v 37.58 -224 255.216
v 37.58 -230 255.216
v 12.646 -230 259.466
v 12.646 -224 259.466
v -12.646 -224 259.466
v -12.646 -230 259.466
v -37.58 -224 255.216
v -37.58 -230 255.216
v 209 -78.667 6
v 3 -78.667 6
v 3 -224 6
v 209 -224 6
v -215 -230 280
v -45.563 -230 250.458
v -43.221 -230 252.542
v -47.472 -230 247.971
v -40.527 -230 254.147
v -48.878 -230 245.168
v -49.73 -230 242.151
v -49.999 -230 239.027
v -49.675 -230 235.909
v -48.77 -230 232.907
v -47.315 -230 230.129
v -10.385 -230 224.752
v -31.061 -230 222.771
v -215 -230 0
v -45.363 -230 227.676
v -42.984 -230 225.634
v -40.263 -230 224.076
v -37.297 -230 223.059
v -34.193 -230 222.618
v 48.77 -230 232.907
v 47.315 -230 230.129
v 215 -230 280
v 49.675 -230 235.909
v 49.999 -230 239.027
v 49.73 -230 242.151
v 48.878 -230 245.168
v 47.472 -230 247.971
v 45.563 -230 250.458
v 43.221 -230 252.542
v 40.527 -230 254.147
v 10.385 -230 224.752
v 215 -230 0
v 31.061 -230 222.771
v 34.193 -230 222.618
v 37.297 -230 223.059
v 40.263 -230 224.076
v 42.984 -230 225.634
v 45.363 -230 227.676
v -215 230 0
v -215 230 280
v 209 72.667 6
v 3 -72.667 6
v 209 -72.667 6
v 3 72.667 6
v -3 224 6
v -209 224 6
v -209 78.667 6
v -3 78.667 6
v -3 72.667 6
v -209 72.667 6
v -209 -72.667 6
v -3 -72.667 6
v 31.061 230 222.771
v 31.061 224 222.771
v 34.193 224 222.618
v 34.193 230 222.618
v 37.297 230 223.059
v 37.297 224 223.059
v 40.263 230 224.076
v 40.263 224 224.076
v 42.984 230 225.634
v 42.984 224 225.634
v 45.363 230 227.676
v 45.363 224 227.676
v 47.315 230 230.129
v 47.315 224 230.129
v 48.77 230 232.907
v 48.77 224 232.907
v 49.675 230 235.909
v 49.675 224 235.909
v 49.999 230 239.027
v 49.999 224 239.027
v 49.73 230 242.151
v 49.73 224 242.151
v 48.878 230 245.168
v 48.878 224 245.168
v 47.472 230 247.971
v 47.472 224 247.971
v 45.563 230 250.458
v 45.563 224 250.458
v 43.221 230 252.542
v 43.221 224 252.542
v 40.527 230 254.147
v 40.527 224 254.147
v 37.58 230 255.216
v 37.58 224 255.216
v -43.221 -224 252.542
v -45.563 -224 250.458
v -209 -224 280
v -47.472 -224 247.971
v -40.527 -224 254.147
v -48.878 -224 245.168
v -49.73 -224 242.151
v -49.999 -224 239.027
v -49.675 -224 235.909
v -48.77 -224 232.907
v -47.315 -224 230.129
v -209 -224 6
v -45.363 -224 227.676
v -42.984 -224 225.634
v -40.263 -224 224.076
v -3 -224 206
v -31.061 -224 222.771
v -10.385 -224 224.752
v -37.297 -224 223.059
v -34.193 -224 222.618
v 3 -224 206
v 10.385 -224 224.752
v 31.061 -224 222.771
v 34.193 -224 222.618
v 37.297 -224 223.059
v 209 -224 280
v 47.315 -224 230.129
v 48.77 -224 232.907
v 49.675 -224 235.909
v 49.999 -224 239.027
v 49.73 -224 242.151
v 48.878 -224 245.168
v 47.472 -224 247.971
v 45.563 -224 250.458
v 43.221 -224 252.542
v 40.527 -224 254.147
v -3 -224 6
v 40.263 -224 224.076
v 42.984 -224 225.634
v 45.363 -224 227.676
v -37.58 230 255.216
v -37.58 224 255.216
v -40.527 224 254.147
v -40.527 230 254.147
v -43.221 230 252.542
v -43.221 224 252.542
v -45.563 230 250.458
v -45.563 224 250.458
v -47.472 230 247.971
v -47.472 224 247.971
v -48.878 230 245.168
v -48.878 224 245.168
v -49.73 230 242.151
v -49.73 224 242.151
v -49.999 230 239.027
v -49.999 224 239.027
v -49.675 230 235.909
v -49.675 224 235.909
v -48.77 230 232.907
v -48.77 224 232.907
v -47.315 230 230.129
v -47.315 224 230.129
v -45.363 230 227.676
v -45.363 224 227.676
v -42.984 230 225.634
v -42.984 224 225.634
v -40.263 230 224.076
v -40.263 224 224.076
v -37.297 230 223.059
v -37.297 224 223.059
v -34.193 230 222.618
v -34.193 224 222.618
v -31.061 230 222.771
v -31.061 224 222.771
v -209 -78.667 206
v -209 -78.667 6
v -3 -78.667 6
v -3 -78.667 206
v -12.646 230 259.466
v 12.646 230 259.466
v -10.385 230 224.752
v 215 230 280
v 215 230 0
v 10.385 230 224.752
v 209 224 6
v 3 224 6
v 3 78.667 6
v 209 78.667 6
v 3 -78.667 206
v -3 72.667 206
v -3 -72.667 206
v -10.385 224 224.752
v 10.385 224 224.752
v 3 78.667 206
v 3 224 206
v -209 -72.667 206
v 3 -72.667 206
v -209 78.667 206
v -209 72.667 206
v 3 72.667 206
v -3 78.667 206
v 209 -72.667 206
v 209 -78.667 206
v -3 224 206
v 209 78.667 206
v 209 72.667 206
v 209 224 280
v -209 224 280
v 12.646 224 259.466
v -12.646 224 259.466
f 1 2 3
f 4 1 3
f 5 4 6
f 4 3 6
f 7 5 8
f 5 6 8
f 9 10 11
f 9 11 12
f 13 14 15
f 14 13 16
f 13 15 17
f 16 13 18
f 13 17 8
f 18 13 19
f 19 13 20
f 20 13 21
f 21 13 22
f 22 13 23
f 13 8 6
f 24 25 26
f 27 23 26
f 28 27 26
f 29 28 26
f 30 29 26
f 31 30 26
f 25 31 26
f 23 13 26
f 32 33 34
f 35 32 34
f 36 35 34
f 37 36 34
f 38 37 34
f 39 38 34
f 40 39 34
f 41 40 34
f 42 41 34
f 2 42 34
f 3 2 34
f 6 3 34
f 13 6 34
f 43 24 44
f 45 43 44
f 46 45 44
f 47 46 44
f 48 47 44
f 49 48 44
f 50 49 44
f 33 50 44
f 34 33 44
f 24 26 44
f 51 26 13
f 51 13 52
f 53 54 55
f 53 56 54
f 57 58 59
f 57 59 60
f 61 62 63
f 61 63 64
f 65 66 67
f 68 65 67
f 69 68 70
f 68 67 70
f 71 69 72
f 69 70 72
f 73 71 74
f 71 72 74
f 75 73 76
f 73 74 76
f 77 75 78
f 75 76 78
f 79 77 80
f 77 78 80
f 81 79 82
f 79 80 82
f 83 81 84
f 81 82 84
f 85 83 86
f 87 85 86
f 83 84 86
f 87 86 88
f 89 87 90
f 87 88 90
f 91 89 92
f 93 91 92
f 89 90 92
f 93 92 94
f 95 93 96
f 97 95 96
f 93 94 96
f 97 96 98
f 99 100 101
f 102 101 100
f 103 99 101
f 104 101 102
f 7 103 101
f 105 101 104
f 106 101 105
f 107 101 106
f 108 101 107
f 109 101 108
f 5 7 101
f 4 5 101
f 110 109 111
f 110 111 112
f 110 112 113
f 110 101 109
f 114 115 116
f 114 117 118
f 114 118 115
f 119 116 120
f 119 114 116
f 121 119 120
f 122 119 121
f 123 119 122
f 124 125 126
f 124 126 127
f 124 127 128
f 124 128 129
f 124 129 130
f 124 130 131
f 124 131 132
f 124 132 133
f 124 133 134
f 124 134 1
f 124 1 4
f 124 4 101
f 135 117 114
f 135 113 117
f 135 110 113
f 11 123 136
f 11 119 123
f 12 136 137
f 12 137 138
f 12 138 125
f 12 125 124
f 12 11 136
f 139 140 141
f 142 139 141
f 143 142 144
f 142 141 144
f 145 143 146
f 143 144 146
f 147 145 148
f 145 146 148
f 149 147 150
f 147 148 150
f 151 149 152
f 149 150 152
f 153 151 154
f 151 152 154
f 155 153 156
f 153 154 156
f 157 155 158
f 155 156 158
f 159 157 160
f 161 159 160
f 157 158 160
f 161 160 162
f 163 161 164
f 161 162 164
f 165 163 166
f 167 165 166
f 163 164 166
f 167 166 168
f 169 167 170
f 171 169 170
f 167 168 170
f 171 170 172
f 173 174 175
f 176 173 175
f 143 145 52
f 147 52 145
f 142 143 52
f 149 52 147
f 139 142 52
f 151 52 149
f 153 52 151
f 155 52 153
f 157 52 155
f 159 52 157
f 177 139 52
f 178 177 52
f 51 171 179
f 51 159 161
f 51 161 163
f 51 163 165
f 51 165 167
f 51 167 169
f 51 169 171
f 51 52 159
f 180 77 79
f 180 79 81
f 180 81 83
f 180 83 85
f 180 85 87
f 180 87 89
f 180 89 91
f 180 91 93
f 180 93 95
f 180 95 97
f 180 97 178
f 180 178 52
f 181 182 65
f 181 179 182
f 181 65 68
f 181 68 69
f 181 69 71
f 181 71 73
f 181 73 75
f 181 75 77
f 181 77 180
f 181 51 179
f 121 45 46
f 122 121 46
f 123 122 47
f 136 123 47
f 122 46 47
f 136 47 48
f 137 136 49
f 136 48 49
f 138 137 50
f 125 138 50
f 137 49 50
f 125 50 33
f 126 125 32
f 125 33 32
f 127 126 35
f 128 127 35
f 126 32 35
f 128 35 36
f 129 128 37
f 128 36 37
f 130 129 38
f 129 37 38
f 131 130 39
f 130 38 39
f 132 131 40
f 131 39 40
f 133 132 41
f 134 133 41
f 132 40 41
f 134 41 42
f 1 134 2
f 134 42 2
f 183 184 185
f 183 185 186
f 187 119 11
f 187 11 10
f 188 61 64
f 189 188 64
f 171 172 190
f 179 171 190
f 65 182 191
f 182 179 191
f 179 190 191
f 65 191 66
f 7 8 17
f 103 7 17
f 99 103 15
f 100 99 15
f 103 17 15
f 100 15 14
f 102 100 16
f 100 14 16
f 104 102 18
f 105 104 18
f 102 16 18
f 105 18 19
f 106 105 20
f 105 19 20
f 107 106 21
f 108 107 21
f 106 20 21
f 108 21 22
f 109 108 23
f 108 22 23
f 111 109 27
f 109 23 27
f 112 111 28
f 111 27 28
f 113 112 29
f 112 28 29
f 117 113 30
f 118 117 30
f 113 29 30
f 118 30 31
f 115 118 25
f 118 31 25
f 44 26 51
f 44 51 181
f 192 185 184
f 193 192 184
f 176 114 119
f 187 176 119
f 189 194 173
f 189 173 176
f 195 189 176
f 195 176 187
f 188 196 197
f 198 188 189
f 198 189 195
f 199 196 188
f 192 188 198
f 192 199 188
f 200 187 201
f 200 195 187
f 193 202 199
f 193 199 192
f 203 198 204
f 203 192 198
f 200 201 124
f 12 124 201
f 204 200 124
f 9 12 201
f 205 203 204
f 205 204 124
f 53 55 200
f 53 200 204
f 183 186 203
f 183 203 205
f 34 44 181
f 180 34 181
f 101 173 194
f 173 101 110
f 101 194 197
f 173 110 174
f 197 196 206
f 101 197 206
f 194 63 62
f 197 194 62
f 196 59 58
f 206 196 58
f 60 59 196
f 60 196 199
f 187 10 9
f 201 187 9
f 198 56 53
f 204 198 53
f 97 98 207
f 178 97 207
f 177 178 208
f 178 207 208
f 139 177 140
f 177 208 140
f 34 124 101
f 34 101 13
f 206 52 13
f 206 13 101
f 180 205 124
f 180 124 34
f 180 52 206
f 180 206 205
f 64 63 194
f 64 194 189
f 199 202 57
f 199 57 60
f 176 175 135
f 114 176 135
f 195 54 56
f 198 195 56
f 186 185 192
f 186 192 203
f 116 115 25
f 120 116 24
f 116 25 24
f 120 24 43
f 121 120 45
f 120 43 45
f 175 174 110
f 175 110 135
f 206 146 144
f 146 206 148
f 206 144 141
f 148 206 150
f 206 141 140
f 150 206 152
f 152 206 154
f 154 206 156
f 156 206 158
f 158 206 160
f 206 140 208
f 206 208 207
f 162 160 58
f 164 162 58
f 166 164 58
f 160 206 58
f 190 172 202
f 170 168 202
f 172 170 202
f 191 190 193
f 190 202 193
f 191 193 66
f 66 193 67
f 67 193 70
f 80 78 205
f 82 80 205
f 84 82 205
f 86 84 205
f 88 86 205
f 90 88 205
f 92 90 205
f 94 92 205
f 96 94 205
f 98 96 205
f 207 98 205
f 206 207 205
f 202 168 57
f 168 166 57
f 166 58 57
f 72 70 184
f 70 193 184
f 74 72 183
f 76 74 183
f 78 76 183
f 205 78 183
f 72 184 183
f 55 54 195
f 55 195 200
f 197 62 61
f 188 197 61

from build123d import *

# Parameters (mm, degrees)
F0_W     = 430
F0_H     = 460
F1_DEPTH = 280
F2_T     = -6
F4_DEPTH = 460.001
F5_W     = 206
F5_H     = 6
F6_DEPTH = 200


with BuildPart() as f1:
    # F0 (on Top) → F1 (new body)
    with BuildSketch(Plane.XY):
        Rectangle(F0_W, F0_H)
    extrude(amount=F1_DEPTH)

    # F2
    f2_openings = [f1.faces().sort_by_distance(p)[0] for p in [
        (0, 0, 280),
    ]]
    offset(amount=F2_T, openings=f2_openings)

    # F3 (on face) → F4 (cut, through all)
    with BuildSketch(Plane.XZ.offset(230)):
        with BuildLine():
            ThreePointArc((31.061347, 222.770627), (49.67535, 235.90859), (37.579824, 255.216242))
            ThreePointArc((37.579824, 255.216242), (0, 260), (-37.579824, 255.216242))
            ThreePointArc((-37.579824, 255.216242), (-49.67535, 235.90859), (-31.061347, 222.770627))
            ThreePointArc((-31.061347, 222.770627), (0, 225), (31.061347, 222.770627))
        make_face()
    extrude(amount=-F4_DEPTH, mode=Mode.SUBTRACT)

    # F5 (on face) → F6 (join)
    with BuildSketch(Plane.XY.offset(6)):
        Polygon((3, 78.666667), (3, 224), (-3, 224), (-3, 78.666667), (-3, 72.666667), (-3, -72.666667), (-3, -78.666667), (-3, -224), (3, -224), (3, -78.666667), (3, -72.666667), (3, 72.666667), align=None)
        with Locations((106, 75.666667)):
            Rectangle(F5_W, F5_H)
        with Locations((-106, 75.666667)):
            Rectangle(F5_W, F5_H)
        with Locations((106, -75.666667)):
            Rectangle(F5_W, F5_H)
        with Locations((-106, -75.666667)):
            Rectangle(F5_W, F5_H)
    extrude(amount=F6_DEPTH)


solid = f1.part
